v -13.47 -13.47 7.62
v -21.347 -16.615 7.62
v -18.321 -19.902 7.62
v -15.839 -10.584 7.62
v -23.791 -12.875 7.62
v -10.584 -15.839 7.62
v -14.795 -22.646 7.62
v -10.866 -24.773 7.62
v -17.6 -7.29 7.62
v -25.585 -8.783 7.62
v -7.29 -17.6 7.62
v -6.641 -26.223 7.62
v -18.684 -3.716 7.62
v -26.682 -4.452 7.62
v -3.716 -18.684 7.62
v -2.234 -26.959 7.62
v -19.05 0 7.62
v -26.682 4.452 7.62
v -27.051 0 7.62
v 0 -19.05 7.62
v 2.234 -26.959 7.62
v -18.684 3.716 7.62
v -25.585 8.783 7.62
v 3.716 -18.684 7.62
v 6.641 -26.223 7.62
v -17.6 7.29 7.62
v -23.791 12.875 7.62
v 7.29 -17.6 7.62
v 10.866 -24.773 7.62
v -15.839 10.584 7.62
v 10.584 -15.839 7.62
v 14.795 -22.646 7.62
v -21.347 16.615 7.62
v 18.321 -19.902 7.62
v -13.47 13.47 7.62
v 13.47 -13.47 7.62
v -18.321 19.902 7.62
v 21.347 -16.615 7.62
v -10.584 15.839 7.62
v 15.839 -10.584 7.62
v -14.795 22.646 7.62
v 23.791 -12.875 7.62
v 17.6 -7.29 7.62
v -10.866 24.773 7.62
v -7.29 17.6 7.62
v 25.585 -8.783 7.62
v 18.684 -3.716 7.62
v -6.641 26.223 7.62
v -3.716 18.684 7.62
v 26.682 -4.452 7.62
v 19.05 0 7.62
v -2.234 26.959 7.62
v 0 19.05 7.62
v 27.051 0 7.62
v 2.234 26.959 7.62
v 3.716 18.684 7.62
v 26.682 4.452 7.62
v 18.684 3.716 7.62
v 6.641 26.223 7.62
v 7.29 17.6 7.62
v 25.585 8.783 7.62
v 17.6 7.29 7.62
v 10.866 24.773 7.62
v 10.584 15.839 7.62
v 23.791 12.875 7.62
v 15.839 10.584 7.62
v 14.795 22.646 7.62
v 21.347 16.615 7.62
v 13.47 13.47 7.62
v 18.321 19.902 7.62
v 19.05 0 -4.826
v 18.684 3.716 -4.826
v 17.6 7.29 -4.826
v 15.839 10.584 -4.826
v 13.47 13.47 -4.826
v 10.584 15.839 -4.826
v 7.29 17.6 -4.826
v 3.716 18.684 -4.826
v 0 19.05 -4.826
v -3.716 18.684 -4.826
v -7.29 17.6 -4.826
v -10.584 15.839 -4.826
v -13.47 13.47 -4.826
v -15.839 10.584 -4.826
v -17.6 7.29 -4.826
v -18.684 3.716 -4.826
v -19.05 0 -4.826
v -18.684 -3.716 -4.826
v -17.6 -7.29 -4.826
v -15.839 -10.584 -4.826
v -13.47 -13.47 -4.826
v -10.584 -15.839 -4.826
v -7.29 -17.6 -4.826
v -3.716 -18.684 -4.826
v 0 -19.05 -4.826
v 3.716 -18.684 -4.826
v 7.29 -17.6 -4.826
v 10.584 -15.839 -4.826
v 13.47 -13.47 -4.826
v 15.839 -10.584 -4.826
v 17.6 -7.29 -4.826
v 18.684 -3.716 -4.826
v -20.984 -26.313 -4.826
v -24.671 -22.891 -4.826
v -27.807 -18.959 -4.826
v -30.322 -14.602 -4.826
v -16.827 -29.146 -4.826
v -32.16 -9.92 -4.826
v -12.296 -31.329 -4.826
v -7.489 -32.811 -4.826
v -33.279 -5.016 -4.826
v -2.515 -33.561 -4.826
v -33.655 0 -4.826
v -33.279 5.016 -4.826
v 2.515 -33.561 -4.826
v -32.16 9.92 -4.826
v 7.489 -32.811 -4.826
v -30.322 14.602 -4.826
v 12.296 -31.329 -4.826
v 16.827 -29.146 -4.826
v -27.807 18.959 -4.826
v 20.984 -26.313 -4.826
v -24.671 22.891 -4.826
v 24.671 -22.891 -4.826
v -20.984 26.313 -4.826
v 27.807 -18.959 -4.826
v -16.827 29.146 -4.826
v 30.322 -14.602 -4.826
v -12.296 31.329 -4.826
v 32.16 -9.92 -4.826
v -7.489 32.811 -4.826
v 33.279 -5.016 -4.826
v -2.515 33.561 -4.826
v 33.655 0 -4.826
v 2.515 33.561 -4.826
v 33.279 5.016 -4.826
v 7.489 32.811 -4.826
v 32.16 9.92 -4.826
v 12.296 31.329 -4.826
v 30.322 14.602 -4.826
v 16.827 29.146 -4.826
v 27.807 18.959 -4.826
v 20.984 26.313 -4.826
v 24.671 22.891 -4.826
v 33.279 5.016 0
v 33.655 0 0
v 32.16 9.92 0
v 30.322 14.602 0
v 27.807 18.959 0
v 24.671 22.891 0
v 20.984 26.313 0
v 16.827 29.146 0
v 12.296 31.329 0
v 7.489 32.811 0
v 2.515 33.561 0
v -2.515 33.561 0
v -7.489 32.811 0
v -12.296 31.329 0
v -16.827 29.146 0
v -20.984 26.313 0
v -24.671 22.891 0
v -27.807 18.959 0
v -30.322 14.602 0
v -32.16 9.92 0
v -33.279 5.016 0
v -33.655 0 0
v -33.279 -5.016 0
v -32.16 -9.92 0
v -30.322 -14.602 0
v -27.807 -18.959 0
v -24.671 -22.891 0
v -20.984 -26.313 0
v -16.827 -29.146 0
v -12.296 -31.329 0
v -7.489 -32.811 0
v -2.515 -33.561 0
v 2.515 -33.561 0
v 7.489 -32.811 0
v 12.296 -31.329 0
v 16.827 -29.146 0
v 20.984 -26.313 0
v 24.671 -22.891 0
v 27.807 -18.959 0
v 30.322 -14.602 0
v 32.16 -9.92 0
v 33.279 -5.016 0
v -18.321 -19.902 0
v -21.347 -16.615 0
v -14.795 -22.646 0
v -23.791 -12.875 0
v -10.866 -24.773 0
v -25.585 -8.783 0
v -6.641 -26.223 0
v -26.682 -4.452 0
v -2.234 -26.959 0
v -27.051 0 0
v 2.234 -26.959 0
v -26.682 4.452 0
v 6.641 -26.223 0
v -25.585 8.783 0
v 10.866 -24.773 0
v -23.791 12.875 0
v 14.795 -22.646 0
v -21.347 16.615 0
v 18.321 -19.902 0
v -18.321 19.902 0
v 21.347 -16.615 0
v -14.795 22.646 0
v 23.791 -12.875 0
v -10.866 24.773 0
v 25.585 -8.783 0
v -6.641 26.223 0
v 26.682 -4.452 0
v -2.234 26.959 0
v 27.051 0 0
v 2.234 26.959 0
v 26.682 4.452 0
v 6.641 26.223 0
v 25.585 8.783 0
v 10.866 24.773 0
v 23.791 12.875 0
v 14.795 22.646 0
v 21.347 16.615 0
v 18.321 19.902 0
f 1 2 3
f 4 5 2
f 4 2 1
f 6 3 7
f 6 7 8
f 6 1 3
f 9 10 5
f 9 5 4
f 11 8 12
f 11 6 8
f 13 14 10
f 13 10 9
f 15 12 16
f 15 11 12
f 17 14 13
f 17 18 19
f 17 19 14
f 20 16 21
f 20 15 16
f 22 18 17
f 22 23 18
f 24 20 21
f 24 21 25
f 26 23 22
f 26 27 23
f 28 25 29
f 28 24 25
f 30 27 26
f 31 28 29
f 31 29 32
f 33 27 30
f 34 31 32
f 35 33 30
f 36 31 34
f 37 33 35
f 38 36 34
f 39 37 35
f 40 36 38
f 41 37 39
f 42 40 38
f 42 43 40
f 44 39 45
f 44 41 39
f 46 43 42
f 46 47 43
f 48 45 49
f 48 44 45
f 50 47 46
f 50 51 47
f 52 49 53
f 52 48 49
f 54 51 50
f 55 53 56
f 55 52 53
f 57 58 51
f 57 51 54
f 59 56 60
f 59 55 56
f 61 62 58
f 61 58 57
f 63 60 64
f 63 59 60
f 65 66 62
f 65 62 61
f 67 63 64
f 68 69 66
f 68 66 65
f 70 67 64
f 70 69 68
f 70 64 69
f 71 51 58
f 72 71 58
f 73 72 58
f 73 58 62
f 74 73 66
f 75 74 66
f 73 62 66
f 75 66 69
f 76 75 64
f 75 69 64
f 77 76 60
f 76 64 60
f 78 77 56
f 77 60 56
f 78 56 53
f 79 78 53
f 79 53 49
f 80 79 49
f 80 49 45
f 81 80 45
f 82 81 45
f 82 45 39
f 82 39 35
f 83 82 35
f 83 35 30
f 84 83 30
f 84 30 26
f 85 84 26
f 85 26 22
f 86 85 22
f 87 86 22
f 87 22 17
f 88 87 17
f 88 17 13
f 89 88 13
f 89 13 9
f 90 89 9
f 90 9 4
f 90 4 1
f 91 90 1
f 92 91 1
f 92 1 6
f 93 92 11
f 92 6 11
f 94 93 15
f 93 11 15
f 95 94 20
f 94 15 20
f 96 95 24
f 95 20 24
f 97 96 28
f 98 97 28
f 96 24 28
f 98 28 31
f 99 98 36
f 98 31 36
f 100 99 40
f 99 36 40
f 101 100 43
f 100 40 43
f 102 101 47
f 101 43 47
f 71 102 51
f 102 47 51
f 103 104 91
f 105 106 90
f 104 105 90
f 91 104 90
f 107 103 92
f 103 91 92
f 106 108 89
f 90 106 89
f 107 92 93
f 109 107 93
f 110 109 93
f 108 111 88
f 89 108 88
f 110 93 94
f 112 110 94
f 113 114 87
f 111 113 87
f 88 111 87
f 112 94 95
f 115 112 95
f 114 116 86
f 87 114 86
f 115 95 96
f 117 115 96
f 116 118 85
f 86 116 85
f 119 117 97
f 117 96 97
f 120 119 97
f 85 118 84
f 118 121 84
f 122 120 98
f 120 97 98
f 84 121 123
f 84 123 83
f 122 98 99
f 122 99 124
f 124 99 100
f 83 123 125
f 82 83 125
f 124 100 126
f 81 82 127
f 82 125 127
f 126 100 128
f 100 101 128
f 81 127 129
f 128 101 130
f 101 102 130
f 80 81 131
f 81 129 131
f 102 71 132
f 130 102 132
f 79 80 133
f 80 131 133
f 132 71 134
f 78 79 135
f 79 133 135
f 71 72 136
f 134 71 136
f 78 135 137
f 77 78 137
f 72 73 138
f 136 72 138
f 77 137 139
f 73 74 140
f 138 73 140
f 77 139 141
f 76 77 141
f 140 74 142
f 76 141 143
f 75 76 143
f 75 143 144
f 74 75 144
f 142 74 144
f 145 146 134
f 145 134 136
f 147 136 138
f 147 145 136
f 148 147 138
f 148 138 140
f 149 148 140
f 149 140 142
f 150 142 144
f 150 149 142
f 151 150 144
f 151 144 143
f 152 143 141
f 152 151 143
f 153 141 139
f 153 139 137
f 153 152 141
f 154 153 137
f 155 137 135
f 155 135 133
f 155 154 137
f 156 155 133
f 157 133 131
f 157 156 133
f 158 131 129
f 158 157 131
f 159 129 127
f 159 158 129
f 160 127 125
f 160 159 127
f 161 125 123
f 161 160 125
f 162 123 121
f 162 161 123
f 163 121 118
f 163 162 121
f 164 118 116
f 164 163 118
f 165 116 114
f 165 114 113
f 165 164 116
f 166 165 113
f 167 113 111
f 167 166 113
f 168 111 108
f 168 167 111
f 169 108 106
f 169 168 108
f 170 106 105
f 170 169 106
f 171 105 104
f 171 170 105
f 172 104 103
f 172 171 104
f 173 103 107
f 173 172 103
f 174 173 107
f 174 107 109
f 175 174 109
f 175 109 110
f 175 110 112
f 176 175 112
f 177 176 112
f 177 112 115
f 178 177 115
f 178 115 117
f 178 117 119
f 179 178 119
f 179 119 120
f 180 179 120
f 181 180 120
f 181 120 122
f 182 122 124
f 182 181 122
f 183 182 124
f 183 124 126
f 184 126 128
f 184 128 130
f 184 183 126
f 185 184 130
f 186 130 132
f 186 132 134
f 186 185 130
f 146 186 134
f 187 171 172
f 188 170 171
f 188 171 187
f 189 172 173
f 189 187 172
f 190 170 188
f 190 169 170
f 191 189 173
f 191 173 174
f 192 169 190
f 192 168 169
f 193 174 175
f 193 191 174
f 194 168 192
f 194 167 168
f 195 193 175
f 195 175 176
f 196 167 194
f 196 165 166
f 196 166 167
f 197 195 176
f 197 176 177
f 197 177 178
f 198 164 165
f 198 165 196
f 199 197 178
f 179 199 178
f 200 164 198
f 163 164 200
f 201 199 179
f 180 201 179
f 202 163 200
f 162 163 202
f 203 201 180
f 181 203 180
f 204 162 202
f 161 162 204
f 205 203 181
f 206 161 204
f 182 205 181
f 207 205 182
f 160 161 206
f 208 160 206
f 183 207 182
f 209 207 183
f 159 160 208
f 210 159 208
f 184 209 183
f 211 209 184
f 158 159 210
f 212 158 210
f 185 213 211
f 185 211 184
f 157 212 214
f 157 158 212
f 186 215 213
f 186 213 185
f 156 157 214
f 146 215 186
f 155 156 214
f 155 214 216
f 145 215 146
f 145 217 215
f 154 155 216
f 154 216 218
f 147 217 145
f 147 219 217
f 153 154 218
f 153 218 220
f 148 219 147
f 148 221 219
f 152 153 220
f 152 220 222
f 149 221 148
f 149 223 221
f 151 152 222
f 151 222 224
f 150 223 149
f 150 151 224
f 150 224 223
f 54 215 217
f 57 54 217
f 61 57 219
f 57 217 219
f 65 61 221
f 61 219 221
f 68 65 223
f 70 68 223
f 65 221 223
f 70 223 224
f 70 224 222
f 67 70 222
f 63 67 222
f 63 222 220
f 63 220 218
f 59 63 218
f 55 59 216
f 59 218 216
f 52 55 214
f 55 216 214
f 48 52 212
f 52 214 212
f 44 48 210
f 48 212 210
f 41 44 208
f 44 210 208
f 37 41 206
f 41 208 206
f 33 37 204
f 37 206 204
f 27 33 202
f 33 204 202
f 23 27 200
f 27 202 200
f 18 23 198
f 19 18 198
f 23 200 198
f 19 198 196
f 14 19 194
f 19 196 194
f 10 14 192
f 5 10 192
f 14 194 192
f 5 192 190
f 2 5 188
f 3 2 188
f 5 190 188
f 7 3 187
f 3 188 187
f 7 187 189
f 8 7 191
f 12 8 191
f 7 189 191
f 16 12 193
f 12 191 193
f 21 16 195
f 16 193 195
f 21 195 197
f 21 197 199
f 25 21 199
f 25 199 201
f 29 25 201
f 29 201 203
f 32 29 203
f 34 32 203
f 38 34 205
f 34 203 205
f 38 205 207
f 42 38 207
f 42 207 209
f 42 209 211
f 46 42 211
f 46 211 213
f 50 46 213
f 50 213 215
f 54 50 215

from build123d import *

# Parameters (mm, degrees)
F0_R     = 33.655
F1_DEPTH = 4.826
F2_R     = 27.051
F3_DEPTH = 7.62
F4_R     = 19.05
F5_DEPTH = 12.447


with BuildPart() as f1:
    # F0 (on Top) → F1 (new body)
    with BuildSketch(Plane.XY):
        Circle(F0_R)
    extrude(amount=-F1_DEPTH)

    # F2 (on Top) → F3 (join)
    with BuildSketch(Plane.XY):
        Circle(F2_R)
    extrude(amount=F3_DEPTH)

    # F4 (on face) → F5 (cut, through all)
    with BuildSketch(Plane.XY.offset(7.62)):
        Circle(F4_R)
    extrude(amount=-F5_DEPTH, mode=Mode.SUBTRACT)


solid = f1.part
